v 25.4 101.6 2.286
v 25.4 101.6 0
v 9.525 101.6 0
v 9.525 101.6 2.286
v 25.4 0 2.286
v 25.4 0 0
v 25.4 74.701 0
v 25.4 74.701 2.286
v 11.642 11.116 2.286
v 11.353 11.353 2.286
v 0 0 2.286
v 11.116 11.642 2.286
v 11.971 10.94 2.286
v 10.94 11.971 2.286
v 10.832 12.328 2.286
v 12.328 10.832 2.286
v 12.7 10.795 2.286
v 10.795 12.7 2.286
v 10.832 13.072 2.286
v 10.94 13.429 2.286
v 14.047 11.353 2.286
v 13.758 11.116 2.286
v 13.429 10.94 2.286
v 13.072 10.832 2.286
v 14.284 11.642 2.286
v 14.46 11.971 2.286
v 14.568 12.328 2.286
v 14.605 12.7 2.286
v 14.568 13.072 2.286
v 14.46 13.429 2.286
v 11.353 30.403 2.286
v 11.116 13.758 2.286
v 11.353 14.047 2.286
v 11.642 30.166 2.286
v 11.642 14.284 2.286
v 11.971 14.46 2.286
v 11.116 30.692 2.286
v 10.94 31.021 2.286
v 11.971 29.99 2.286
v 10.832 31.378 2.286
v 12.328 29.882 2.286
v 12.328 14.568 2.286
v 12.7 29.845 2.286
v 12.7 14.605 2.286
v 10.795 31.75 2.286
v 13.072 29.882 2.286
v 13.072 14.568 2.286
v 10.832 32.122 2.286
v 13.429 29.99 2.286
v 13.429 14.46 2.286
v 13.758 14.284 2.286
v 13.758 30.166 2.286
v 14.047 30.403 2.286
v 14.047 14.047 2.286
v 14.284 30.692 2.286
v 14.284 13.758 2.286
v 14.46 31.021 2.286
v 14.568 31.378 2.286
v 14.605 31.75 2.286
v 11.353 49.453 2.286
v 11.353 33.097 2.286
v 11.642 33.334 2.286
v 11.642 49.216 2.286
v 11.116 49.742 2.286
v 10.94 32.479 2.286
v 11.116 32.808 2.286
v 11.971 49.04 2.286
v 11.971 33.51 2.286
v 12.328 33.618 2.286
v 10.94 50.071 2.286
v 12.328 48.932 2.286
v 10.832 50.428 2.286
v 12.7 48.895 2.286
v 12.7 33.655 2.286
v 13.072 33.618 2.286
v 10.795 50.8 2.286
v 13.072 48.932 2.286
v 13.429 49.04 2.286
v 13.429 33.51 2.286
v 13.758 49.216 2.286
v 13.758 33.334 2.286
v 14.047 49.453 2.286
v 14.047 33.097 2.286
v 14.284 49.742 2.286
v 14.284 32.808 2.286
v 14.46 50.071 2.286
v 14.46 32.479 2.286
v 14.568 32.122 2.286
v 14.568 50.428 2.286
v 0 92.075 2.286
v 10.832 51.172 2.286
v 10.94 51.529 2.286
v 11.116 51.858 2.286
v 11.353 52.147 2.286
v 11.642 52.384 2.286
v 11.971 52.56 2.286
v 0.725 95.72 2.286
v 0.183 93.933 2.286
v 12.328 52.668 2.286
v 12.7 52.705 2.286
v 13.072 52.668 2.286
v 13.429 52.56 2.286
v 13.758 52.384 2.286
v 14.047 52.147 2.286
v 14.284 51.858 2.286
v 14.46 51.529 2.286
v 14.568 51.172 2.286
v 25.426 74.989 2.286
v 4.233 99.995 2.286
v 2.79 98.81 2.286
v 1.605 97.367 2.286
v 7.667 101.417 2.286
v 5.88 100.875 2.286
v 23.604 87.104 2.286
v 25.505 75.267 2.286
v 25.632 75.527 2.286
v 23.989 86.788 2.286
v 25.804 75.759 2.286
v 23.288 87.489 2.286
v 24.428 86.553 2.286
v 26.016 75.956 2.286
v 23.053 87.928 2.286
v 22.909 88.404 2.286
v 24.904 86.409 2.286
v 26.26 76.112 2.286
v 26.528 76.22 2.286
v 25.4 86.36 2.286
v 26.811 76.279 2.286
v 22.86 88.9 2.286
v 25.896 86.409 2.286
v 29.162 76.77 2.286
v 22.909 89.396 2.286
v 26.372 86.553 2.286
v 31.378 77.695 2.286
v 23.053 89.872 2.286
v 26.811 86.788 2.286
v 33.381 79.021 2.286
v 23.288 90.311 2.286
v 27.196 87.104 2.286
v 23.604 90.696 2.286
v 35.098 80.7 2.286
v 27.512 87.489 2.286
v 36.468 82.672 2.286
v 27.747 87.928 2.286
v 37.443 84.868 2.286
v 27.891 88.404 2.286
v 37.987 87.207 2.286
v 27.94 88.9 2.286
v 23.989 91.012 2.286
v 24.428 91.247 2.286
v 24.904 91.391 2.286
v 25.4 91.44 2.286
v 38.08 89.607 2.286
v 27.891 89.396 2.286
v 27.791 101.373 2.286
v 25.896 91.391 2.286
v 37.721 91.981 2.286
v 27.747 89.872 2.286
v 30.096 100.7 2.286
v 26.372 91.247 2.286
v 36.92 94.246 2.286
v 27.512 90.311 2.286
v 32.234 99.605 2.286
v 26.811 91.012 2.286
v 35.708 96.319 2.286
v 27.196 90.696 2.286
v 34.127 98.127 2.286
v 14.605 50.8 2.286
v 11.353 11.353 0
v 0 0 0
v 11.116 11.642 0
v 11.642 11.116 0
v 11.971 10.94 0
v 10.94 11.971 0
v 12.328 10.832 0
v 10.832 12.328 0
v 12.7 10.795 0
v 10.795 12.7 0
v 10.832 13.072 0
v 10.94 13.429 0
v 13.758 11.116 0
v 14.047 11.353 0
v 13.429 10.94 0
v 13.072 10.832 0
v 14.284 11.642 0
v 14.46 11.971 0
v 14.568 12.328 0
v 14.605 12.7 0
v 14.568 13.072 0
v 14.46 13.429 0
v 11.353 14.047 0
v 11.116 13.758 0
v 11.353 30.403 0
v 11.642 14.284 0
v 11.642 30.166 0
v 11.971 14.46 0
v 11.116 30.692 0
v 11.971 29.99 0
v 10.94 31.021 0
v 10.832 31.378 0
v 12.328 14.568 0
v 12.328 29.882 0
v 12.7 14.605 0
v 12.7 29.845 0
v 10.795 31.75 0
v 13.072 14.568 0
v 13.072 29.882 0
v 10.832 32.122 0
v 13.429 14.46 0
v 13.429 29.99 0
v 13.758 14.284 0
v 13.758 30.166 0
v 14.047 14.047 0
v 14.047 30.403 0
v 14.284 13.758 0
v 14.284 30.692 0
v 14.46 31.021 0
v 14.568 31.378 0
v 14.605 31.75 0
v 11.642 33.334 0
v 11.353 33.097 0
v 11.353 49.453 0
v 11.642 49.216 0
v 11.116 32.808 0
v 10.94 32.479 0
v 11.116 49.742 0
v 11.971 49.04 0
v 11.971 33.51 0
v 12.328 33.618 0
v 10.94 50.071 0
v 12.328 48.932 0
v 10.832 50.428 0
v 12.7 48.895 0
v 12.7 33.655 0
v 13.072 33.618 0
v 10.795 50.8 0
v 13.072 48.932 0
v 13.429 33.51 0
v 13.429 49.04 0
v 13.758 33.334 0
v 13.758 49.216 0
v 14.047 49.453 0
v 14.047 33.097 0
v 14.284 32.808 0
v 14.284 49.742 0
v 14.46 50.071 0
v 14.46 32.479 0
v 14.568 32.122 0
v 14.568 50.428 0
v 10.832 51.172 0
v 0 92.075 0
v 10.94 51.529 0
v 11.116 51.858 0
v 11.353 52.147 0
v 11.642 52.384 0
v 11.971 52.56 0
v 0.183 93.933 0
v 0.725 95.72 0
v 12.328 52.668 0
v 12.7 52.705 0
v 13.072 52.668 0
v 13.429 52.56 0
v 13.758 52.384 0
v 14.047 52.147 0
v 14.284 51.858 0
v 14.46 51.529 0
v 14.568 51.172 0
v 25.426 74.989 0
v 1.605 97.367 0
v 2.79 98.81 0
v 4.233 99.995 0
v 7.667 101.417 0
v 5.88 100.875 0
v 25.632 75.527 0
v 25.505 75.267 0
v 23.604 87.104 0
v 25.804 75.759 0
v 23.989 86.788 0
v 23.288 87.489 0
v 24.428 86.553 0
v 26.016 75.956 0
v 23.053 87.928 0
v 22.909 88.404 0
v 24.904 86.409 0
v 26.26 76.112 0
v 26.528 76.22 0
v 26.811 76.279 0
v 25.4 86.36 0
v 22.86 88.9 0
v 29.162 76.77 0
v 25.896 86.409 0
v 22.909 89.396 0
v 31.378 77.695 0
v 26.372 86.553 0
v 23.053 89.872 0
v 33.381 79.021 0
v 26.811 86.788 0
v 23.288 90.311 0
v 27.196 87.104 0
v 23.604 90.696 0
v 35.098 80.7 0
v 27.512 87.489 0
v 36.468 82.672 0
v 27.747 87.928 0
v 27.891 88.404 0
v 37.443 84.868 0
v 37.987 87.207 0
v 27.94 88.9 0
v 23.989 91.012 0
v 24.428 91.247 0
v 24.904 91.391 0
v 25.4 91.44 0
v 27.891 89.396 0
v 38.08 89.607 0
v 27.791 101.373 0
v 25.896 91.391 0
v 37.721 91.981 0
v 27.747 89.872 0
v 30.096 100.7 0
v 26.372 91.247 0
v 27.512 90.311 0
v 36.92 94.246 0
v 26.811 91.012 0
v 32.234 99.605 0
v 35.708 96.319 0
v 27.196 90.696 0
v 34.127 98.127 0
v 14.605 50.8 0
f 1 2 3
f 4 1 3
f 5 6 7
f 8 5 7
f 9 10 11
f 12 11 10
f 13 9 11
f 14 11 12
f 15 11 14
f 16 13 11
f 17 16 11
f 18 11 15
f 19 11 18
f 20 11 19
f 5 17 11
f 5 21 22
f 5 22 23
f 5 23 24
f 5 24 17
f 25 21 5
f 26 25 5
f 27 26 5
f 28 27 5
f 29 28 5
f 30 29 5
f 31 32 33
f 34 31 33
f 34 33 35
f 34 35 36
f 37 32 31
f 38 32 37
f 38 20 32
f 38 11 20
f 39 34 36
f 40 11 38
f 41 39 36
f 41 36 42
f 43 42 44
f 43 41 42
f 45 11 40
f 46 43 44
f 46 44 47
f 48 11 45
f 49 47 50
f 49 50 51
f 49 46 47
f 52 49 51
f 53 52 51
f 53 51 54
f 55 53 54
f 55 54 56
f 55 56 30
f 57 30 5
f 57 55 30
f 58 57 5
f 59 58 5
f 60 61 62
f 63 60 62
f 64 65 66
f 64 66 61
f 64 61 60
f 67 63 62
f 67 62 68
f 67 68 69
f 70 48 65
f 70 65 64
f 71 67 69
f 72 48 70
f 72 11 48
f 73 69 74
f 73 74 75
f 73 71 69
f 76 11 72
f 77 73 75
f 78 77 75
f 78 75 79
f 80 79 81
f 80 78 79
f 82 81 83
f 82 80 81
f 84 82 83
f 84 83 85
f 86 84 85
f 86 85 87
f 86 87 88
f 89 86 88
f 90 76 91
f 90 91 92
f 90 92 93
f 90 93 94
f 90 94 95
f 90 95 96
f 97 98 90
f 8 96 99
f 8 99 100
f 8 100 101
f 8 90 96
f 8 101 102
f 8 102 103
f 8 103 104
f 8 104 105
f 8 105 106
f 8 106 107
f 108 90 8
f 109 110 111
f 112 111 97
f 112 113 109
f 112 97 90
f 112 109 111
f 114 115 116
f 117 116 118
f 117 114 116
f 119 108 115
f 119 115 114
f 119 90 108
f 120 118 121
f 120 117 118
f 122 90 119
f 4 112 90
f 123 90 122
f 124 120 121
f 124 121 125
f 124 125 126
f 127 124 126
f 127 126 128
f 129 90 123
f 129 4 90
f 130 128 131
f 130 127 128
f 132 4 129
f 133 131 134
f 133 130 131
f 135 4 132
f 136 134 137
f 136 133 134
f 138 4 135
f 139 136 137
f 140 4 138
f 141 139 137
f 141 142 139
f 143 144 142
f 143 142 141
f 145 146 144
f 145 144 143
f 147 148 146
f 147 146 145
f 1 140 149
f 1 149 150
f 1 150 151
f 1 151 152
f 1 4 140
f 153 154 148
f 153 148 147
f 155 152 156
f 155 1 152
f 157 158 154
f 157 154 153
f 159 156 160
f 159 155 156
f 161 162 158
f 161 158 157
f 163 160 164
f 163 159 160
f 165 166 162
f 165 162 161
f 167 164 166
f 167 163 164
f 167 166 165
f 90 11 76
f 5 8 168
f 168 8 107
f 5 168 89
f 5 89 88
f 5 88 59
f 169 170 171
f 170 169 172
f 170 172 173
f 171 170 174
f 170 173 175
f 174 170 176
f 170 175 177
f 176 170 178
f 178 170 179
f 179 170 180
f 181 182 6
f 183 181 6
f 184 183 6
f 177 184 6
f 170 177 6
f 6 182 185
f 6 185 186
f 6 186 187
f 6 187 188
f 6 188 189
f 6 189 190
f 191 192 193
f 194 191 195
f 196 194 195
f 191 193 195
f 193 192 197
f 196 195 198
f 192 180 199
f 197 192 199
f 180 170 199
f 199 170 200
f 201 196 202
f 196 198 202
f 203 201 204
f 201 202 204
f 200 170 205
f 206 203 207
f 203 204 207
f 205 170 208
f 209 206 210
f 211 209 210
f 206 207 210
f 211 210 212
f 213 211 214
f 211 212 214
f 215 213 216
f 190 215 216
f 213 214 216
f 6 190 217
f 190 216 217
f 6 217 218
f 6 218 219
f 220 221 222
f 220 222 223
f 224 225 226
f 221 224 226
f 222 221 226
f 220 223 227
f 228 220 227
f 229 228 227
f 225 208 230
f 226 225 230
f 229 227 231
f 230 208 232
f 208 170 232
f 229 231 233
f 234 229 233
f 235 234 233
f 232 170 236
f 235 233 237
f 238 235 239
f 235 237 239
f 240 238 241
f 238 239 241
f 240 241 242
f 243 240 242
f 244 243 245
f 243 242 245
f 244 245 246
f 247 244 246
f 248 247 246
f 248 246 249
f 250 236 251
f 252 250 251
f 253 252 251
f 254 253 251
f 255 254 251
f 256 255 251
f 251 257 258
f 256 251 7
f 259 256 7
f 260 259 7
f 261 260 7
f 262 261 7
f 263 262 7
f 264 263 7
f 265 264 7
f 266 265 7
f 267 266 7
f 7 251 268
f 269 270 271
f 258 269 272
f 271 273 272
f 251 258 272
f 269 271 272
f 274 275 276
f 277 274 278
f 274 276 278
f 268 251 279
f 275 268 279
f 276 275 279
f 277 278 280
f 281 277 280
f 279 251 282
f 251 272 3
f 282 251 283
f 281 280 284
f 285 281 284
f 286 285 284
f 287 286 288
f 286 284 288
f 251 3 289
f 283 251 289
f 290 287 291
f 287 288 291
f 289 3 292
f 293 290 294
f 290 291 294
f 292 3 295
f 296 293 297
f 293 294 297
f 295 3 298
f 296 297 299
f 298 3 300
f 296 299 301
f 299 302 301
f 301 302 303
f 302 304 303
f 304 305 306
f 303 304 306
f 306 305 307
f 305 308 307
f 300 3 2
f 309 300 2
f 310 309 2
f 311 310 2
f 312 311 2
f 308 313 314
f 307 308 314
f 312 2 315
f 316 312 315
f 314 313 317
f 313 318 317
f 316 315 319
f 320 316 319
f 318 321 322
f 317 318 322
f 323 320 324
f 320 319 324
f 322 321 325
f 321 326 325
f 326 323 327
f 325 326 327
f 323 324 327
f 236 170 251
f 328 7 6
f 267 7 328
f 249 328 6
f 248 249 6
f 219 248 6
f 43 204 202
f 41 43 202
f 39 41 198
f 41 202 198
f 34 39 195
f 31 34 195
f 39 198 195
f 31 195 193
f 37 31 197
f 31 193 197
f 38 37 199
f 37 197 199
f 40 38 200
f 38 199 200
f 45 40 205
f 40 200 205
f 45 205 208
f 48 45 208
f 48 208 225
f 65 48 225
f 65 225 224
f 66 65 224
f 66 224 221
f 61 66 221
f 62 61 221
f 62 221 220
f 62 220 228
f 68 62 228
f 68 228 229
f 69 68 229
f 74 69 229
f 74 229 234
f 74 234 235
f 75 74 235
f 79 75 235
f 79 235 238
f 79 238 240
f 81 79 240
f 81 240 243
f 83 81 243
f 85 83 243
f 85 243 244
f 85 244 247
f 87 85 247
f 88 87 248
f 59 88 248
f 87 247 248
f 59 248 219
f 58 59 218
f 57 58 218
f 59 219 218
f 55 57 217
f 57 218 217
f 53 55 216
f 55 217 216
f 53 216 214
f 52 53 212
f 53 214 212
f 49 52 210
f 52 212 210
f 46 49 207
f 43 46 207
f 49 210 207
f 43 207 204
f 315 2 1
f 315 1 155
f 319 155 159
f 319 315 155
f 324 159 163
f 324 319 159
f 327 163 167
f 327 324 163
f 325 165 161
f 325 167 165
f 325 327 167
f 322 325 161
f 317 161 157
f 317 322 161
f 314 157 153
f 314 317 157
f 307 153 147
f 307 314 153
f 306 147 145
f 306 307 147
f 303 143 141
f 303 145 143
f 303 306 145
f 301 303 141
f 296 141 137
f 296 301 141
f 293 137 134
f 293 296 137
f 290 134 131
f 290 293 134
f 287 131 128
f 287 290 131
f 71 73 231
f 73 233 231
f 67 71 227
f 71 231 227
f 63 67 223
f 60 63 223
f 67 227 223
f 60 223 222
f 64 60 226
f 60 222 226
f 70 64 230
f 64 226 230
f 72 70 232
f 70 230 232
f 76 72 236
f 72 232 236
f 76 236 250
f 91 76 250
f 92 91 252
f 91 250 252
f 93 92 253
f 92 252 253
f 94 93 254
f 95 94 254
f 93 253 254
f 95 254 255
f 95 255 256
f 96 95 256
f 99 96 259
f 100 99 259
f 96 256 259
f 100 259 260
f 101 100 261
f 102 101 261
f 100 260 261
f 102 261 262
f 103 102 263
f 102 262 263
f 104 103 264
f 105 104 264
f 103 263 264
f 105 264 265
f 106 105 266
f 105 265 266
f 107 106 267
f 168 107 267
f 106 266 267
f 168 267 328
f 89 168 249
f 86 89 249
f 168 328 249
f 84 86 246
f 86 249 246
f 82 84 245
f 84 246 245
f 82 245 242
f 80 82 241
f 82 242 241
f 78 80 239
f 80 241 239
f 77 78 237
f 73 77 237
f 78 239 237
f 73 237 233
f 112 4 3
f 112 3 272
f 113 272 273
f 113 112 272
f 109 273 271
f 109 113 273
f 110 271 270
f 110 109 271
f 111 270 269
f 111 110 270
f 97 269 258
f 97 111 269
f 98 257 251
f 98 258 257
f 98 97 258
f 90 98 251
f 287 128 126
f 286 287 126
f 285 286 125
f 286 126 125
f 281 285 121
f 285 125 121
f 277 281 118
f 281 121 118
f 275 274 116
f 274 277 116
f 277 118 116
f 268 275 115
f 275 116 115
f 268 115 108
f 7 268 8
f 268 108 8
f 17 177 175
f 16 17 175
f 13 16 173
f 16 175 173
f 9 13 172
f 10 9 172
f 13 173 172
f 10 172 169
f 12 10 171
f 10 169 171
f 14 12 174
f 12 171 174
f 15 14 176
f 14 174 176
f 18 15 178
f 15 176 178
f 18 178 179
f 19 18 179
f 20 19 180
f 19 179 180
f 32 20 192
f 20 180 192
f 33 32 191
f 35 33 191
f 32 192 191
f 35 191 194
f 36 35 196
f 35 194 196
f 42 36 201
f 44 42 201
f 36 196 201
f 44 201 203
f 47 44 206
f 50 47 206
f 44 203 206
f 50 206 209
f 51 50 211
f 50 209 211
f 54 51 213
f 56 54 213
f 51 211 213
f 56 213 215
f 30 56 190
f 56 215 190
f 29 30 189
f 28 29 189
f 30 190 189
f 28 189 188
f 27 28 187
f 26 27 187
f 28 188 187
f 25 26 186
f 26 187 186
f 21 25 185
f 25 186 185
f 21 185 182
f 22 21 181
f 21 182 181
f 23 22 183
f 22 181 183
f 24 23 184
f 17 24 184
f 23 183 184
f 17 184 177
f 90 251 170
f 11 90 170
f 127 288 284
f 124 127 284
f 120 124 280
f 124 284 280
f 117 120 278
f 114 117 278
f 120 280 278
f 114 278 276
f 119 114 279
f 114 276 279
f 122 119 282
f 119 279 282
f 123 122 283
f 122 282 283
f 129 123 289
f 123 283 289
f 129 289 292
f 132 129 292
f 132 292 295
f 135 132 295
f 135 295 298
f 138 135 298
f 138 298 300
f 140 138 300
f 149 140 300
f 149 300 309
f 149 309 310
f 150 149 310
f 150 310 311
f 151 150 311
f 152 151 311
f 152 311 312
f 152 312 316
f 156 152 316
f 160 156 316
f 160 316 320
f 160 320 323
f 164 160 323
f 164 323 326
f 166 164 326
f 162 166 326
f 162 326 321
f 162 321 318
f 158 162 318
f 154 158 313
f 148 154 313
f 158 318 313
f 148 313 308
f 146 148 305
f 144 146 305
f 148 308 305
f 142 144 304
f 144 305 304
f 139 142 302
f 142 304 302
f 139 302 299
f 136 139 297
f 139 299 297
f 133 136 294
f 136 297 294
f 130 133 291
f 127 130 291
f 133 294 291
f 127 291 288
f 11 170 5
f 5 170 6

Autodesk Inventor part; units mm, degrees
ref_plane "YZ Plane" through (0, 0, 0) normal (1, 0, 0) x (0, 1, 0)
ref_plane "XZ Plane" through (0, 0, 0) normal (0, 1, 0) x (-1, 0, 0)
ref_plane "XY Plane" through (0, 0, 0) normal (0, 0, 1) x (1, 0, 0)
sketch "Sketch1" plane through (0, 0, 0) normal (0, 0, 1) x (1, 0, 0)
  line L0 (0, 0) -> (25.4, 0)
  line L1 (25.4, 0) -> (25.4, 101.6)
  line L2 (25.4, 101.6) -> (0, 101.6)
  line L3 (0, 101.6) -> (0, 0)
  arc A0 (25.4, 76.2) -> (25.4, 101.6) centre (25.4, 88.9) ccw
  dimension "d0" = 101.6
  dimension "d1" = 25.4
  dimension "d2" = 25.4
extrude "Extrusion1" add sketch "Sketch1" along normal blind 2.286
sketch "Sketch3" plane through (0, 0, 2.286) normal (0, 0, 1) x (1, 0, 0)
  line L0 (0, 101.6) -> (0, 0) projected
  line L1 (0, 0) -> (25.4, 0) projected
  line L2 (25.4, 101.6) -> (0, 101.6) projected
  line L3 (25.4, 0) -> (25.4, 76.2) projected
  line L4 (0, 0) -> (25.4, 0)
  line L5 (25.4, 0) -> (25.4, 63.5)
  line L6 (25.4, 63.5) -> (0, 63.5)
  line L7 (0, 63.5) -> (0, 0)
  point P0 (12.7, 50.8)
  point P1 (12.7, 12.7)
  point P2 (12.7, 31.75)
  point P3 (12.7, 0)
  dimension "d50" = 12.7
  dimension "d53" = 38.1
  dimension "d54" = 63.5
  dimension "d55" = 19.05
hole "Hole1" at (12.7, 50.8, 2.286) at (12.7, 12.7, 2.286) at (12.7, 31.75, 2.286) direction (0, 0, -1) diameter 3.81 end through all
sketch "Sketch4" plane through (0, 0, 2.286) normal (0, 0, 1) x (1, 0, 0)
  line L0 (25.4, 0) -> (25.4, 76.2) projected
  arc A0 (25.4, 76.2) -> (25.4, 101.6) centre (25.4, 88.9) ccw projected
  point P0 (0, 0)
hole "Hole2" at (25.4, 88.9, 2.286) direction (0, 0, -1) diameter 5.08 end through all
fillet "Fillet1" radius 9.525 1 edges at (0, 101.6, 1.143)
fillet "Fillet2" radius 1.5875 1 edges at (25.4, 76.2, 1.143)
equation "\"d2\" = d1"
properties part number "WJ_CLB_027_LifterBracket" material "Aluminum 6061"
